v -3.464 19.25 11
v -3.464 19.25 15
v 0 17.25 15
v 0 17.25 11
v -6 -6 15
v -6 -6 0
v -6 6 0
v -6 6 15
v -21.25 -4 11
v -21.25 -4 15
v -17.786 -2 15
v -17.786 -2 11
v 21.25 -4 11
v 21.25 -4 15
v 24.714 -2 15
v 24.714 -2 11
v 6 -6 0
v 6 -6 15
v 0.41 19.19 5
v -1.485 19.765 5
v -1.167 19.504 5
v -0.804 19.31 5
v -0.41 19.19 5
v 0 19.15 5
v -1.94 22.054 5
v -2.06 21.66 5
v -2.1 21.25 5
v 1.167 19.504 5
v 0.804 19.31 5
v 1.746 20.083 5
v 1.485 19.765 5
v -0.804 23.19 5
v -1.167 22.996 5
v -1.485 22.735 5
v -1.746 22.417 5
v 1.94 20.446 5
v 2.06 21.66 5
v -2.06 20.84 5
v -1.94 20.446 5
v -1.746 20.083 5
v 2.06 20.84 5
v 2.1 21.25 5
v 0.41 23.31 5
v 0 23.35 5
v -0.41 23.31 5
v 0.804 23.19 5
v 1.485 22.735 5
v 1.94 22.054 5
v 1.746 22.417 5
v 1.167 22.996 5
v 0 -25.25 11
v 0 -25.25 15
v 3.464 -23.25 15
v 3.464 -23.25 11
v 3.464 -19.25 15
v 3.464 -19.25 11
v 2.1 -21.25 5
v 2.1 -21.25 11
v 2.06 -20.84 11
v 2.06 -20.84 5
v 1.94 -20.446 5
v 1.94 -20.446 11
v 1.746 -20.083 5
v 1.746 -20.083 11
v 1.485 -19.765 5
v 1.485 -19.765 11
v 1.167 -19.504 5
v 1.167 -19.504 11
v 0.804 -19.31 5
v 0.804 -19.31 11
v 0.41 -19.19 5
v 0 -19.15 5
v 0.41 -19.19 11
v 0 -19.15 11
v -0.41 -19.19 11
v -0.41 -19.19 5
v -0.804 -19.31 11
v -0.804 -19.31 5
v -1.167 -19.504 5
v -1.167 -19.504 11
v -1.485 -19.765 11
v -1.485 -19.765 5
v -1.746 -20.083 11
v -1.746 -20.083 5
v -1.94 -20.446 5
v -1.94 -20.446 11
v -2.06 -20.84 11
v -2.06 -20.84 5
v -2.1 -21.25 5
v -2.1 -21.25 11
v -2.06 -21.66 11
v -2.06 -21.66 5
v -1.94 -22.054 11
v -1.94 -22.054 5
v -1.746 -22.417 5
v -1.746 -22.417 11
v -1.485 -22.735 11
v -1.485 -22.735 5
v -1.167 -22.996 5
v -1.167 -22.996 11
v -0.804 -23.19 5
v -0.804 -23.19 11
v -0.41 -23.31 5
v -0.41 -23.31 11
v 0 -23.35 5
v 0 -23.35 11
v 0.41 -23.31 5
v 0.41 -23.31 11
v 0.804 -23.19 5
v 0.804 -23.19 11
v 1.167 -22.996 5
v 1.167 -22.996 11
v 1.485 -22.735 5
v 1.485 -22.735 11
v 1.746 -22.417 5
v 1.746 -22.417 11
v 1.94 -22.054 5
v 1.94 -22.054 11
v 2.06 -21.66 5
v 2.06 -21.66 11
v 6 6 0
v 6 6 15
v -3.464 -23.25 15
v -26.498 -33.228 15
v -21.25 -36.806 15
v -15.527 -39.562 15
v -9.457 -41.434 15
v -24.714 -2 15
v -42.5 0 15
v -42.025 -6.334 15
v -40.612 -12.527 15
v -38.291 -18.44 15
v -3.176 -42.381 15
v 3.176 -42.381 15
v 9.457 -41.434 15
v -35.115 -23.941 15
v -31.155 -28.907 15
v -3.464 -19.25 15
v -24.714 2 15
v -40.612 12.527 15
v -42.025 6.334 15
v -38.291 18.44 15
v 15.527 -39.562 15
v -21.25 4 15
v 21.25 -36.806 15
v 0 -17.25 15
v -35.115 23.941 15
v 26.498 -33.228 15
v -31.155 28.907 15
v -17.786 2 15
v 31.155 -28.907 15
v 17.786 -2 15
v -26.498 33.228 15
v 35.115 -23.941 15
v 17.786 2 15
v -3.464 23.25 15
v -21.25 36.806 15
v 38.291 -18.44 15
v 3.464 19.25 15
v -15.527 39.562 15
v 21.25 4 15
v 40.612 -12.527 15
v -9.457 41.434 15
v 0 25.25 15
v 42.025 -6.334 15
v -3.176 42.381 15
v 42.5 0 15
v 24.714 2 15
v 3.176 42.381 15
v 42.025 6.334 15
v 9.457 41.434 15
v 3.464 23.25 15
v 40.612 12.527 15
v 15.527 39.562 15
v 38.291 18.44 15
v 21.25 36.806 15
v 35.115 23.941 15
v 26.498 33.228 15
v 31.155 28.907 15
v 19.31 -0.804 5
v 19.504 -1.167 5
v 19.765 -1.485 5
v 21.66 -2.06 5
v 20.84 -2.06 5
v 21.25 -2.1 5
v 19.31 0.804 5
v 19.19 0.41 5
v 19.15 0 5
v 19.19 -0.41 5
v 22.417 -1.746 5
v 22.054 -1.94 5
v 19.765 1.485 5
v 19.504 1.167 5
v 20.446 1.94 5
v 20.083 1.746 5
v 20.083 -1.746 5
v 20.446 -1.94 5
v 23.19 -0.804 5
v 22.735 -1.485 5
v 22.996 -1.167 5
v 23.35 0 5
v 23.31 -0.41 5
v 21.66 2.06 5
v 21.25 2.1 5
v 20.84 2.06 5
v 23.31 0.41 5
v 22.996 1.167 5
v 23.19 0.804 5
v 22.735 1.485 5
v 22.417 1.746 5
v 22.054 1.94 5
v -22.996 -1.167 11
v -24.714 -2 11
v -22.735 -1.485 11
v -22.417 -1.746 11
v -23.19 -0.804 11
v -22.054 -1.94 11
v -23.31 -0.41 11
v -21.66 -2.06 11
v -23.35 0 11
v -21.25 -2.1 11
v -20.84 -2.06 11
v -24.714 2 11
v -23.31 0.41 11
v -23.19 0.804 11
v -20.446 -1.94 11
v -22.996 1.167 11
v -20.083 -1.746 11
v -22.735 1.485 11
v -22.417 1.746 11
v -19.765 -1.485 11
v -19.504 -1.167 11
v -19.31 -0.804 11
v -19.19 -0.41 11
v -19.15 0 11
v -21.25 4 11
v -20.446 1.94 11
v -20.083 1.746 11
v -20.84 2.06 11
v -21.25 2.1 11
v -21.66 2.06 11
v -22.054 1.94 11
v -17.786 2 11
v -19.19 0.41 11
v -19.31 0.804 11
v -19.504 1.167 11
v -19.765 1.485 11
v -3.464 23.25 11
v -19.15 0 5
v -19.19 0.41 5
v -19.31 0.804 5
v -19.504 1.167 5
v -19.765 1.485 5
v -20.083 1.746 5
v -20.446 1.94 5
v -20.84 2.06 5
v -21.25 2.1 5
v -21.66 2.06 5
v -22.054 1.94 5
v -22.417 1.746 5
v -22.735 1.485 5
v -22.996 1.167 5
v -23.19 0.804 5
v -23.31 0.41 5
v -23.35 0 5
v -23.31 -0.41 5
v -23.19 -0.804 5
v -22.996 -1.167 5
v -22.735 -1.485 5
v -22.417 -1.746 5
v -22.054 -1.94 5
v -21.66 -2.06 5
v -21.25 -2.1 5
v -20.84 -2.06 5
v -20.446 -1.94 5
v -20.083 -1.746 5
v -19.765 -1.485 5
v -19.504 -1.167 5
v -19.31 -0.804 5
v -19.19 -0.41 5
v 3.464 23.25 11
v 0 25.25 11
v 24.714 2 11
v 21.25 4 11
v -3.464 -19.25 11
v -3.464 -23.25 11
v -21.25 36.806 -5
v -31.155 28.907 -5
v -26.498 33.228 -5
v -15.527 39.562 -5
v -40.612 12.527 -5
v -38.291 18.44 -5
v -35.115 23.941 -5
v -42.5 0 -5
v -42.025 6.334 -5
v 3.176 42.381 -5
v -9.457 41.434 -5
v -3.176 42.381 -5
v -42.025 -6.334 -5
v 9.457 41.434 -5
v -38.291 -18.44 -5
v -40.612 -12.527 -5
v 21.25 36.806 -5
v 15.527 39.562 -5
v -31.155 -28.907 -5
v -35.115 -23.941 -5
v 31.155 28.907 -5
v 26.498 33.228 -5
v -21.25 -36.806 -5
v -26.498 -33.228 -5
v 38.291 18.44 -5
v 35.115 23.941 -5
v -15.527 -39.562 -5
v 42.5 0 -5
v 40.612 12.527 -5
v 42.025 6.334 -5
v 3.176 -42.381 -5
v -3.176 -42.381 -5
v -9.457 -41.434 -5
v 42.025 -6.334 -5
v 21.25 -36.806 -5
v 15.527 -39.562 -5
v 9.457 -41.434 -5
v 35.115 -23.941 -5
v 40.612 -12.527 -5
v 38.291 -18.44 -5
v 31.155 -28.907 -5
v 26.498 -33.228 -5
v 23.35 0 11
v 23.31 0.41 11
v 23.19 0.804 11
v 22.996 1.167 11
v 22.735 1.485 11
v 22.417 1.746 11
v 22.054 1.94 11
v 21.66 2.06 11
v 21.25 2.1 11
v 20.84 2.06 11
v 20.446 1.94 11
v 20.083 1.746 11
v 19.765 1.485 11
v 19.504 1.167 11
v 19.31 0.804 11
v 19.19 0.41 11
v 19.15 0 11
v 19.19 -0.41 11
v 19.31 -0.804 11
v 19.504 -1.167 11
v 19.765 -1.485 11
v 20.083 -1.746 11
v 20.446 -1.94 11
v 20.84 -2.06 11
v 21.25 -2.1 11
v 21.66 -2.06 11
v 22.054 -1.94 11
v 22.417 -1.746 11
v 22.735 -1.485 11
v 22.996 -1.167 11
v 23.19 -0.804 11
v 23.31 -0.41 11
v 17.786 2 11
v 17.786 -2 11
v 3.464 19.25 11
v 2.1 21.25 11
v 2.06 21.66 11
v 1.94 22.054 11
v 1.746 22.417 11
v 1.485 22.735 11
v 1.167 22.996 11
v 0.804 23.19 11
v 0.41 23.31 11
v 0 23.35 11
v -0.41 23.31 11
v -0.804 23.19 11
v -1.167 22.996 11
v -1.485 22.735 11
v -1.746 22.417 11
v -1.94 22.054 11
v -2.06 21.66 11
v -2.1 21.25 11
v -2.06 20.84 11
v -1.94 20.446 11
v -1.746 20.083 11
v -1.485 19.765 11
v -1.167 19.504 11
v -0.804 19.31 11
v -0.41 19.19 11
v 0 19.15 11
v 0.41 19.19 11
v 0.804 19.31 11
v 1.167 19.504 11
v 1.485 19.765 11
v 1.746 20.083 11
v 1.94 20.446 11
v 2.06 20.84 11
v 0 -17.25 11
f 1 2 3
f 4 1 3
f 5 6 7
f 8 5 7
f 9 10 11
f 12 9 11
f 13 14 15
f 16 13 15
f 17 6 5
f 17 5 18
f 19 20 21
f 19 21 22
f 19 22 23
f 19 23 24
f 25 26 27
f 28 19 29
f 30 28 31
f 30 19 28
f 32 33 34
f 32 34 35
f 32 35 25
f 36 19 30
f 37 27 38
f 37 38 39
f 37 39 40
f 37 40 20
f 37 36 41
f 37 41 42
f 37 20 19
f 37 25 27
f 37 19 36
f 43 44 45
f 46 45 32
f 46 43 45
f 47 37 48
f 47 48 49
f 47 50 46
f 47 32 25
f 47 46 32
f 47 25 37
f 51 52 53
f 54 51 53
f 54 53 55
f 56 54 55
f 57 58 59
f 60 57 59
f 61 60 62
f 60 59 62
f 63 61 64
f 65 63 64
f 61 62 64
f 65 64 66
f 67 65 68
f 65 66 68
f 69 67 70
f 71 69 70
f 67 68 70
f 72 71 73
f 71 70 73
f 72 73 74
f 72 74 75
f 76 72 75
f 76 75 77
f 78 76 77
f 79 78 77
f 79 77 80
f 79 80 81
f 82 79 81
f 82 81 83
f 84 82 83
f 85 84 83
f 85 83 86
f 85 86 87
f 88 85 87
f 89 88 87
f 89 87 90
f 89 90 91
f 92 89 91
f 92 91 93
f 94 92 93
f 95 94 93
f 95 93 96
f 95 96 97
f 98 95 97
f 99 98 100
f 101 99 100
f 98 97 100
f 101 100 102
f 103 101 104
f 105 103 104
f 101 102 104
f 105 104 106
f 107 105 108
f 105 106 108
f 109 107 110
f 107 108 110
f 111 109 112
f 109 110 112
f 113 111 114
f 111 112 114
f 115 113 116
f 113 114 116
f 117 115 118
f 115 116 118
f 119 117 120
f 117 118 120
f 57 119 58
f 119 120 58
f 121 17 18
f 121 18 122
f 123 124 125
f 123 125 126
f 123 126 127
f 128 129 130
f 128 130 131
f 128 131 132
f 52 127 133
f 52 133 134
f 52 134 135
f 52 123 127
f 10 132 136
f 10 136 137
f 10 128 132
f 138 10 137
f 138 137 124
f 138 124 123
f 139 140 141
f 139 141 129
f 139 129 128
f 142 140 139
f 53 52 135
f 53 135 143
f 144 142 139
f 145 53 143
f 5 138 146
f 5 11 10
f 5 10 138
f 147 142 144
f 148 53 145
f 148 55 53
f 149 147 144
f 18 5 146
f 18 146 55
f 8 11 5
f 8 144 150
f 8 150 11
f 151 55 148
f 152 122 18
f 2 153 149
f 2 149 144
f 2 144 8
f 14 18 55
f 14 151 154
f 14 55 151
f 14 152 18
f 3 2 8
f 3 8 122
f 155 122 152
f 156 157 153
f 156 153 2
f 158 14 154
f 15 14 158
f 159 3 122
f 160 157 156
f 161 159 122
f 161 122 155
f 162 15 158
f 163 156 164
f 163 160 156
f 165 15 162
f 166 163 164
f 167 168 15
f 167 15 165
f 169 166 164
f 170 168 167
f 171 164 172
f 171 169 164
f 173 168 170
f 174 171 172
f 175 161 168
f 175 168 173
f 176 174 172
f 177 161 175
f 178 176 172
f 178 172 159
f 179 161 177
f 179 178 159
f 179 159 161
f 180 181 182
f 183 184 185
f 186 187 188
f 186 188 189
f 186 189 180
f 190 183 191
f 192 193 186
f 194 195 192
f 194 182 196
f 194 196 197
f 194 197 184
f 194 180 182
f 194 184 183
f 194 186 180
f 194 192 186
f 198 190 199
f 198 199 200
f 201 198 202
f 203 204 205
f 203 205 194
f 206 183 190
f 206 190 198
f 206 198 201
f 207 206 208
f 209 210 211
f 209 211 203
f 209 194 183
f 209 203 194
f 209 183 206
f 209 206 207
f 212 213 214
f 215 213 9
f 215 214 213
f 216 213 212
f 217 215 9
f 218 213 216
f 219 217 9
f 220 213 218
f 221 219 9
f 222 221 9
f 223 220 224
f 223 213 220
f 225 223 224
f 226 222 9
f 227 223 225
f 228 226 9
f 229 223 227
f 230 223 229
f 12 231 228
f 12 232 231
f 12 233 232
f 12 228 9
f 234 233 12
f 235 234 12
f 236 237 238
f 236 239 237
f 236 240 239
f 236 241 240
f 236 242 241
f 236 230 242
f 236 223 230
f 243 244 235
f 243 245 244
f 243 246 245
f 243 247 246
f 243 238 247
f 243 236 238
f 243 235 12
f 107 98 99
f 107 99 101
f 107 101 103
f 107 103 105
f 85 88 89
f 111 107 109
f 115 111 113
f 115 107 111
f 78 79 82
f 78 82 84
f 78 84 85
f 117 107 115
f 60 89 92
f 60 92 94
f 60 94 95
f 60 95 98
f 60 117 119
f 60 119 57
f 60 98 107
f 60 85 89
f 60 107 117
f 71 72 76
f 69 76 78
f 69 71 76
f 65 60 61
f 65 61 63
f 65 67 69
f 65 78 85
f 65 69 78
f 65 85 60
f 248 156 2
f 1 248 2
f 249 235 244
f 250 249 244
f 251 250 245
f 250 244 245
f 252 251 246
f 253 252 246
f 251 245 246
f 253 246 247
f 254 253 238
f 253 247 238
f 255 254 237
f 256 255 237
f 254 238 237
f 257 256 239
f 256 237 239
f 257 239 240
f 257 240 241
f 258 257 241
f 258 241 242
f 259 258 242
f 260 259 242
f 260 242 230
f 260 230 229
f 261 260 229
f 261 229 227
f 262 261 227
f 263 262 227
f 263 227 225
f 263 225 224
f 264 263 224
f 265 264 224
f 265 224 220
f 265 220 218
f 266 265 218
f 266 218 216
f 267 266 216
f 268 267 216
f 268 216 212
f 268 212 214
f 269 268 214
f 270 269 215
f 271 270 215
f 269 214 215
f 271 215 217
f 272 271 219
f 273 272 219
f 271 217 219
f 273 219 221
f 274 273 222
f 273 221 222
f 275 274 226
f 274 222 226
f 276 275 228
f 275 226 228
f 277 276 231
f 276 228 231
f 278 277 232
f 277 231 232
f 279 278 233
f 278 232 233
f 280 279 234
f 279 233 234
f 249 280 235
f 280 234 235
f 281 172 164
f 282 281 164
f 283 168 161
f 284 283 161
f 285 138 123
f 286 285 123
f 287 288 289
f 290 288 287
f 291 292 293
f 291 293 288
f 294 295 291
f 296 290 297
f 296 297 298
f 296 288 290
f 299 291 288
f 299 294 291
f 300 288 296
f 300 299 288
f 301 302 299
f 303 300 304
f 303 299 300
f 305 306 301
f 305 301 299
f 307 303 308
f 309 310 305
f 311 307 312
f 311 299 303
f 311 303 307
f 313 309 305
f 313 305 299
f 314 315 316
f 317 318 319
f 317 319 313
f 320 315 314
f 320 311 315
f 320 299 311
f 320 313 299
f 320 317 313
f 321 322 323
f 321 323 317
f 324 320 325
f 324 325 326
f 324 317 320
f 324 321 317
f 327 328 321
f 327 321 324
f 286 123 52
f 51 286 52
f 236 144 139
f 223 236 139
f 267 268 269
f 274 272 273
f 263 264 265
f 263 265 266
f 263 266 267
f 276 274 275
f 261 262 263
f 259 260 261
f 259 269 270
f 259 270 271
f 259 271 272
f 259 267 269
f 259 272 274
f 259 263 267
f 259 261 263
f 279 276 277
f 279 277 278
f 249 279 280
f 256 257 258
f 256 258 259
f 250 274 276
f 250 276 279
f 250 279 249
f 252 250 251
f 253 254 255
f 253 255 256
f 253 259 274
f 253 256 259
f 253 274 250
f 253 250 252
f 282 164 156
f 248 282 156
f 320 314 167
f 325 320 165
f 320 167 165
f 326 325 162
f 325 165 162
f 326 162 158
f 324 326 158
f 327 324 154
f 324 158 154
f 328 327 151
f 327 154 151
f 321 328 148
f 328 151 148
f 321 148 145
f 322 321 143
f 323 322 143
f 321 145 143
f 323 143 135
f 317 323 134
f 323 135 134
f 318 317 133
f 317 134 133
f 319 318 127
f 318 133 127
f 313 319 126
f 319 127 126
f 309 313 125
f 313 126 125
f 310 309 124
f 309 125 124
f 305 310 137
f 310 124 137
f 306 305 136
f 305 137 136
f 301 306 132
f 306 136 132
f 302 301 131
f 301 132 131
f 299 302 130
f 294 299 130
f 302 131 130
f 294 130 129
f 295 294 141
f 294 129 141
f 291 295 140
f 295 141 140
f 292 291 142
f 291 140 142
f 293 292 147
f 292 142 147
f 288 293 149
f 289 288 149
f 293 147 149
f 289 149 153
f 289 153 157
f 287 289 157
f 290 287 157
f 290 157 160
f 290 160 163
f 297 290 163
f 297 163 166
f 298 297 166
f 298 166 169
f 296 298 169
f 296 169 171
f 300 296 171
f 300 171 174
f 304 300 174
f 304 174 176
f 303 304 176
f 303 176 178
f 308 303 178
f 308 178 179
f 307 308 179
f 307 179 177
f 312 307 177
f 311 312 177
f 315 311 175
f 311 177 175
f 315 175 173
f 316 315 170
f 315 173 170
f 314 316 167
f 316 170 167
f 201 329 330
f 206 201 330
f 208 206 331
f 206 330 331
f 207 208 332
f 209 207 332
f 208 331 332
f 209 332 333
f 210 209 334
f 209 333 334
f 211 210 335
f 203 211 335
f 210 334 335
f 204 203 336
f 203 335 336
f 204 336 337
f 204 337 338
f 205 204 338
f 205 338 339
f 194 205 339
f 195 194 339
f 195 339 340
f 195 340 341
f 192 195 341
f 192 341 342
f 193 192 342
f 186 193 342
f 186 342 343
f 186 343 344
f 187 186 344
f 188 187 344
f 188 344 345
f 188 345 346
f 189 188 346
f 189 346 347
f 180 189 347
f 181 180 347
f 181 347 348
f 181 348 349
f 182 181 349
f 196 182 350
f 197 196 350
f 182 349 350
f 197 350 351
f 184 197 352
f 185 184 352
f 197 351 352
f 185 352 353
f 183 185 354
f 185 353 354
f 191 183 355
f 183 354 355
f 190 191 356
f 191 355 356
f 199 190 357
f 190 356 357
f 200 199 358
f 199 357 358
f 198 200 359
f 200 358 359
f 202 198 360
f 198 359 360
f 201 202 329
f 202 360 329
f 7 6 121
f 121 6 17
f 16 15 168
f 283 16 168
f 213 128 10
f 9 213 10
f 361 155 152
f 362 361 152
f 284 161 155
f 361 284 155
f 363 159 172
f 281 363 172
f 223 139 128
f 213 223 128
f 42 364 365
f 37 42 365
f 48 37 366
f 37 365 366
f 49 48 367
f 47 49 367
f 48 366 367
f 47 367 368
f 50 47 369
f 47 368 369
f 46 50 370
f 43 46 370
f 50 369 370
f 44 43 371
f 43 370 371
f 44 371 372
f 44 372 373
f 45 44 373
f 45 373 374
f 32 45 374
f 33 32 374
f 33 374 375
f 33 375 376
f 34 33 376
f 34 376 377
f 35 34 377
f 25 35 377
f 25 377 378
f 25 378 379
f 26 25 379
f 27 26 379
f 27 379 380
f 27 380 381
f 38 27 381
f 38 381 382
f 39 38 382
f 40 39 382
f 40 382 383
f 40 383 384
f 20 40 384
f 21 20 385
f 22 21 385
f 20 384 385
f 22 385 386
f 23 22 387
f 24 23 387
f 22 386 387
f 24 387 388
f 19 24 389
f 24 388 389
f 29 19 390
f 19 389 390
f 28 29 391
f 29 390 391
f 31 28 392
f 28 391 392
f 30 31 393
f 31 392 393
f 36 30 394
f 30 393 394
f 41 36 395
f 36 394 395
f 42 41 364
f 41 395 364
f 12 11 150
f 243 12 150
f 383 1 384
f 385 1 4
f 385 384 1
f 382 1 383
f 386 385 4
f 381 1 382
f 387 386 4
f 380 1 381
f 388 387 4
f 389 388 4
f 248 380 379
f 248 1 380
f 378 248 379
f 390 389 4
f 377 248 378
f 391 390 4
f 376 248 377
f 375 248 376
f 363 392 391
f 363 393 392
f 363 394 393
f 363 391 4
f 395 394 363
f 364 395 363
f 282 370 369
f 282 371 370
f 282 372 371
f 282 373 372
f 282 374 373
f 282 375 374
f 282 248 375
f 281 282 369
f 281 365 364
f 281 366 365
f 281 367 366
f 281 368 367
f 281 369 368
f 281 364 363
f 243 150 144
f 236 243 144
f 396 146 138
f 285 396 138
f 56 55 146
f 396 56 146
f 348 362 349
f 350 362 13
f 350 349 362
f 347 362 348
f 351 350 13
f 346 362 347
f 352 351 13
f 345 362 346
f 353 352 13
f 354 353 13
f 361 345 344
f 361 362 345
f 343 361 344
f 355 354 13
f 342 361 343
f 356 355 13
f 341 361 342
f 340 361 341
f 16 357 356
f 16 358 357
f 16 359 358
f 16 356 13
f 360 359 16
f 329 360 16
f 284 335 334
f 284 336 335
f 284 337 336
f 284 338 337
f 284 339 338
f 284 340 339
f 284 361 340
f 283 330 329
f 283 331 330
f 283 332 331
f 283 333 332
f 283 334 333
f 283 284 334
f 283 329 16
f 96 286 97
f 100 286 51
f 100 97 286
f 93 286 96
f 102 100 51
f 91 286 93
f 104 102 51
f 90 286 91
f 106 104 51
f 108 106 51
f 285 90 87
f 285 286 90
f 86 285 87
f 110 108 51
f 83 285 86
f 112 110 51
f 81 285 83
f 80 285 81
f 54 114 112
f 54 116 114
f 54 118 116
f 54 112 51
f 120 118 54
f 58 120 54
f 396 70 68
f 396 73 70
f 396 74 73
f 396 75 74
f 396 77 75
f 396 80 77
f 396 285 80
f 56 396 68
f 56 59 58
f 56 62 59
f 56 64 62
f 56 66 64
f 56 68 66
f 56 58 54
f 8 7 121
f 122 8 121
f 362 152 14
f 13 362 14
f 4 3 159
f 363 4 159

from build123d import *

# Parameters (mm, degrees)
F0_R     = 42.5
F0_W     = 12
F0_H     = 12
F1_DEPTH = 15
F2_R     = 42.5
F3_DEPTH = 5
F4_R     = 2.1
F5_DEPTH = 10
F7_DEPTH = 4


with BuildPart() as f1:
    # F0 (on Top) → F1 (new body)
    with BuildSketch(Plane.XY):
        Circle(F0_R)
        Rectangle(F0_W, F0_H, mode=Mode.SUBTRACT)
    extrude(amount=F1_DEPTH)

    # F2 (on face) → F3 (join)
    with BuildSketch(Plane(origin=(0, 0, 0), x_dir=(1, 0, 0), z_dir=(0, 0, -1))):
        Circle(F2_R)
    extrude(amount=F3_DEPTH)

    # F4 (on face) → F5 (cut)
    with BuildSketch(Plane.XY.offset(15)):
        with Locations((-21.25, 0)):
            Circle(F4_R)
        with Locations((0, 21.25)):
            Circle(F4_R)
        with Locations((21.25, 0)):
            Circle(F4_R)
        with Locations((0, -21.25)):
            Circle(F4_R)
    extrude(amount=-F5_DEPTH, mode=Mode.SUBTRACT)

    # F6 (on face) → F7 (cut)
    with BuildSketch(Plane.XY.offset(15)):
        Polygon((-24.714102, 2), (-24.714102, -2), (-21.25, -4), (-17.785898, -2), (-17.785898, 2), (-21.25, 4), align=None)
        Polygon((-3.464102, 23.25), (-3.464102, 19.25), (0, 17.25), (3.464102, 19.25), (3.464102, 23.25), (0, 25.25), align=None)
        Polygon((17.785898, 2), (17.785898, -2), (21.25, -4), (24.714102, -2), (24.714102, 2), (21.25, 4), align=None)
        Polygon((-3.464102, -19.25), (-3.464102, -23.25), (0, -25.25), (3.464102, -23.25), (3.464102, -19.25), (0, -17.25), align=None)
    extrude(amount=-F7_DEPTH, mode=Mode.SUBTRACT)


solid = f1.part
